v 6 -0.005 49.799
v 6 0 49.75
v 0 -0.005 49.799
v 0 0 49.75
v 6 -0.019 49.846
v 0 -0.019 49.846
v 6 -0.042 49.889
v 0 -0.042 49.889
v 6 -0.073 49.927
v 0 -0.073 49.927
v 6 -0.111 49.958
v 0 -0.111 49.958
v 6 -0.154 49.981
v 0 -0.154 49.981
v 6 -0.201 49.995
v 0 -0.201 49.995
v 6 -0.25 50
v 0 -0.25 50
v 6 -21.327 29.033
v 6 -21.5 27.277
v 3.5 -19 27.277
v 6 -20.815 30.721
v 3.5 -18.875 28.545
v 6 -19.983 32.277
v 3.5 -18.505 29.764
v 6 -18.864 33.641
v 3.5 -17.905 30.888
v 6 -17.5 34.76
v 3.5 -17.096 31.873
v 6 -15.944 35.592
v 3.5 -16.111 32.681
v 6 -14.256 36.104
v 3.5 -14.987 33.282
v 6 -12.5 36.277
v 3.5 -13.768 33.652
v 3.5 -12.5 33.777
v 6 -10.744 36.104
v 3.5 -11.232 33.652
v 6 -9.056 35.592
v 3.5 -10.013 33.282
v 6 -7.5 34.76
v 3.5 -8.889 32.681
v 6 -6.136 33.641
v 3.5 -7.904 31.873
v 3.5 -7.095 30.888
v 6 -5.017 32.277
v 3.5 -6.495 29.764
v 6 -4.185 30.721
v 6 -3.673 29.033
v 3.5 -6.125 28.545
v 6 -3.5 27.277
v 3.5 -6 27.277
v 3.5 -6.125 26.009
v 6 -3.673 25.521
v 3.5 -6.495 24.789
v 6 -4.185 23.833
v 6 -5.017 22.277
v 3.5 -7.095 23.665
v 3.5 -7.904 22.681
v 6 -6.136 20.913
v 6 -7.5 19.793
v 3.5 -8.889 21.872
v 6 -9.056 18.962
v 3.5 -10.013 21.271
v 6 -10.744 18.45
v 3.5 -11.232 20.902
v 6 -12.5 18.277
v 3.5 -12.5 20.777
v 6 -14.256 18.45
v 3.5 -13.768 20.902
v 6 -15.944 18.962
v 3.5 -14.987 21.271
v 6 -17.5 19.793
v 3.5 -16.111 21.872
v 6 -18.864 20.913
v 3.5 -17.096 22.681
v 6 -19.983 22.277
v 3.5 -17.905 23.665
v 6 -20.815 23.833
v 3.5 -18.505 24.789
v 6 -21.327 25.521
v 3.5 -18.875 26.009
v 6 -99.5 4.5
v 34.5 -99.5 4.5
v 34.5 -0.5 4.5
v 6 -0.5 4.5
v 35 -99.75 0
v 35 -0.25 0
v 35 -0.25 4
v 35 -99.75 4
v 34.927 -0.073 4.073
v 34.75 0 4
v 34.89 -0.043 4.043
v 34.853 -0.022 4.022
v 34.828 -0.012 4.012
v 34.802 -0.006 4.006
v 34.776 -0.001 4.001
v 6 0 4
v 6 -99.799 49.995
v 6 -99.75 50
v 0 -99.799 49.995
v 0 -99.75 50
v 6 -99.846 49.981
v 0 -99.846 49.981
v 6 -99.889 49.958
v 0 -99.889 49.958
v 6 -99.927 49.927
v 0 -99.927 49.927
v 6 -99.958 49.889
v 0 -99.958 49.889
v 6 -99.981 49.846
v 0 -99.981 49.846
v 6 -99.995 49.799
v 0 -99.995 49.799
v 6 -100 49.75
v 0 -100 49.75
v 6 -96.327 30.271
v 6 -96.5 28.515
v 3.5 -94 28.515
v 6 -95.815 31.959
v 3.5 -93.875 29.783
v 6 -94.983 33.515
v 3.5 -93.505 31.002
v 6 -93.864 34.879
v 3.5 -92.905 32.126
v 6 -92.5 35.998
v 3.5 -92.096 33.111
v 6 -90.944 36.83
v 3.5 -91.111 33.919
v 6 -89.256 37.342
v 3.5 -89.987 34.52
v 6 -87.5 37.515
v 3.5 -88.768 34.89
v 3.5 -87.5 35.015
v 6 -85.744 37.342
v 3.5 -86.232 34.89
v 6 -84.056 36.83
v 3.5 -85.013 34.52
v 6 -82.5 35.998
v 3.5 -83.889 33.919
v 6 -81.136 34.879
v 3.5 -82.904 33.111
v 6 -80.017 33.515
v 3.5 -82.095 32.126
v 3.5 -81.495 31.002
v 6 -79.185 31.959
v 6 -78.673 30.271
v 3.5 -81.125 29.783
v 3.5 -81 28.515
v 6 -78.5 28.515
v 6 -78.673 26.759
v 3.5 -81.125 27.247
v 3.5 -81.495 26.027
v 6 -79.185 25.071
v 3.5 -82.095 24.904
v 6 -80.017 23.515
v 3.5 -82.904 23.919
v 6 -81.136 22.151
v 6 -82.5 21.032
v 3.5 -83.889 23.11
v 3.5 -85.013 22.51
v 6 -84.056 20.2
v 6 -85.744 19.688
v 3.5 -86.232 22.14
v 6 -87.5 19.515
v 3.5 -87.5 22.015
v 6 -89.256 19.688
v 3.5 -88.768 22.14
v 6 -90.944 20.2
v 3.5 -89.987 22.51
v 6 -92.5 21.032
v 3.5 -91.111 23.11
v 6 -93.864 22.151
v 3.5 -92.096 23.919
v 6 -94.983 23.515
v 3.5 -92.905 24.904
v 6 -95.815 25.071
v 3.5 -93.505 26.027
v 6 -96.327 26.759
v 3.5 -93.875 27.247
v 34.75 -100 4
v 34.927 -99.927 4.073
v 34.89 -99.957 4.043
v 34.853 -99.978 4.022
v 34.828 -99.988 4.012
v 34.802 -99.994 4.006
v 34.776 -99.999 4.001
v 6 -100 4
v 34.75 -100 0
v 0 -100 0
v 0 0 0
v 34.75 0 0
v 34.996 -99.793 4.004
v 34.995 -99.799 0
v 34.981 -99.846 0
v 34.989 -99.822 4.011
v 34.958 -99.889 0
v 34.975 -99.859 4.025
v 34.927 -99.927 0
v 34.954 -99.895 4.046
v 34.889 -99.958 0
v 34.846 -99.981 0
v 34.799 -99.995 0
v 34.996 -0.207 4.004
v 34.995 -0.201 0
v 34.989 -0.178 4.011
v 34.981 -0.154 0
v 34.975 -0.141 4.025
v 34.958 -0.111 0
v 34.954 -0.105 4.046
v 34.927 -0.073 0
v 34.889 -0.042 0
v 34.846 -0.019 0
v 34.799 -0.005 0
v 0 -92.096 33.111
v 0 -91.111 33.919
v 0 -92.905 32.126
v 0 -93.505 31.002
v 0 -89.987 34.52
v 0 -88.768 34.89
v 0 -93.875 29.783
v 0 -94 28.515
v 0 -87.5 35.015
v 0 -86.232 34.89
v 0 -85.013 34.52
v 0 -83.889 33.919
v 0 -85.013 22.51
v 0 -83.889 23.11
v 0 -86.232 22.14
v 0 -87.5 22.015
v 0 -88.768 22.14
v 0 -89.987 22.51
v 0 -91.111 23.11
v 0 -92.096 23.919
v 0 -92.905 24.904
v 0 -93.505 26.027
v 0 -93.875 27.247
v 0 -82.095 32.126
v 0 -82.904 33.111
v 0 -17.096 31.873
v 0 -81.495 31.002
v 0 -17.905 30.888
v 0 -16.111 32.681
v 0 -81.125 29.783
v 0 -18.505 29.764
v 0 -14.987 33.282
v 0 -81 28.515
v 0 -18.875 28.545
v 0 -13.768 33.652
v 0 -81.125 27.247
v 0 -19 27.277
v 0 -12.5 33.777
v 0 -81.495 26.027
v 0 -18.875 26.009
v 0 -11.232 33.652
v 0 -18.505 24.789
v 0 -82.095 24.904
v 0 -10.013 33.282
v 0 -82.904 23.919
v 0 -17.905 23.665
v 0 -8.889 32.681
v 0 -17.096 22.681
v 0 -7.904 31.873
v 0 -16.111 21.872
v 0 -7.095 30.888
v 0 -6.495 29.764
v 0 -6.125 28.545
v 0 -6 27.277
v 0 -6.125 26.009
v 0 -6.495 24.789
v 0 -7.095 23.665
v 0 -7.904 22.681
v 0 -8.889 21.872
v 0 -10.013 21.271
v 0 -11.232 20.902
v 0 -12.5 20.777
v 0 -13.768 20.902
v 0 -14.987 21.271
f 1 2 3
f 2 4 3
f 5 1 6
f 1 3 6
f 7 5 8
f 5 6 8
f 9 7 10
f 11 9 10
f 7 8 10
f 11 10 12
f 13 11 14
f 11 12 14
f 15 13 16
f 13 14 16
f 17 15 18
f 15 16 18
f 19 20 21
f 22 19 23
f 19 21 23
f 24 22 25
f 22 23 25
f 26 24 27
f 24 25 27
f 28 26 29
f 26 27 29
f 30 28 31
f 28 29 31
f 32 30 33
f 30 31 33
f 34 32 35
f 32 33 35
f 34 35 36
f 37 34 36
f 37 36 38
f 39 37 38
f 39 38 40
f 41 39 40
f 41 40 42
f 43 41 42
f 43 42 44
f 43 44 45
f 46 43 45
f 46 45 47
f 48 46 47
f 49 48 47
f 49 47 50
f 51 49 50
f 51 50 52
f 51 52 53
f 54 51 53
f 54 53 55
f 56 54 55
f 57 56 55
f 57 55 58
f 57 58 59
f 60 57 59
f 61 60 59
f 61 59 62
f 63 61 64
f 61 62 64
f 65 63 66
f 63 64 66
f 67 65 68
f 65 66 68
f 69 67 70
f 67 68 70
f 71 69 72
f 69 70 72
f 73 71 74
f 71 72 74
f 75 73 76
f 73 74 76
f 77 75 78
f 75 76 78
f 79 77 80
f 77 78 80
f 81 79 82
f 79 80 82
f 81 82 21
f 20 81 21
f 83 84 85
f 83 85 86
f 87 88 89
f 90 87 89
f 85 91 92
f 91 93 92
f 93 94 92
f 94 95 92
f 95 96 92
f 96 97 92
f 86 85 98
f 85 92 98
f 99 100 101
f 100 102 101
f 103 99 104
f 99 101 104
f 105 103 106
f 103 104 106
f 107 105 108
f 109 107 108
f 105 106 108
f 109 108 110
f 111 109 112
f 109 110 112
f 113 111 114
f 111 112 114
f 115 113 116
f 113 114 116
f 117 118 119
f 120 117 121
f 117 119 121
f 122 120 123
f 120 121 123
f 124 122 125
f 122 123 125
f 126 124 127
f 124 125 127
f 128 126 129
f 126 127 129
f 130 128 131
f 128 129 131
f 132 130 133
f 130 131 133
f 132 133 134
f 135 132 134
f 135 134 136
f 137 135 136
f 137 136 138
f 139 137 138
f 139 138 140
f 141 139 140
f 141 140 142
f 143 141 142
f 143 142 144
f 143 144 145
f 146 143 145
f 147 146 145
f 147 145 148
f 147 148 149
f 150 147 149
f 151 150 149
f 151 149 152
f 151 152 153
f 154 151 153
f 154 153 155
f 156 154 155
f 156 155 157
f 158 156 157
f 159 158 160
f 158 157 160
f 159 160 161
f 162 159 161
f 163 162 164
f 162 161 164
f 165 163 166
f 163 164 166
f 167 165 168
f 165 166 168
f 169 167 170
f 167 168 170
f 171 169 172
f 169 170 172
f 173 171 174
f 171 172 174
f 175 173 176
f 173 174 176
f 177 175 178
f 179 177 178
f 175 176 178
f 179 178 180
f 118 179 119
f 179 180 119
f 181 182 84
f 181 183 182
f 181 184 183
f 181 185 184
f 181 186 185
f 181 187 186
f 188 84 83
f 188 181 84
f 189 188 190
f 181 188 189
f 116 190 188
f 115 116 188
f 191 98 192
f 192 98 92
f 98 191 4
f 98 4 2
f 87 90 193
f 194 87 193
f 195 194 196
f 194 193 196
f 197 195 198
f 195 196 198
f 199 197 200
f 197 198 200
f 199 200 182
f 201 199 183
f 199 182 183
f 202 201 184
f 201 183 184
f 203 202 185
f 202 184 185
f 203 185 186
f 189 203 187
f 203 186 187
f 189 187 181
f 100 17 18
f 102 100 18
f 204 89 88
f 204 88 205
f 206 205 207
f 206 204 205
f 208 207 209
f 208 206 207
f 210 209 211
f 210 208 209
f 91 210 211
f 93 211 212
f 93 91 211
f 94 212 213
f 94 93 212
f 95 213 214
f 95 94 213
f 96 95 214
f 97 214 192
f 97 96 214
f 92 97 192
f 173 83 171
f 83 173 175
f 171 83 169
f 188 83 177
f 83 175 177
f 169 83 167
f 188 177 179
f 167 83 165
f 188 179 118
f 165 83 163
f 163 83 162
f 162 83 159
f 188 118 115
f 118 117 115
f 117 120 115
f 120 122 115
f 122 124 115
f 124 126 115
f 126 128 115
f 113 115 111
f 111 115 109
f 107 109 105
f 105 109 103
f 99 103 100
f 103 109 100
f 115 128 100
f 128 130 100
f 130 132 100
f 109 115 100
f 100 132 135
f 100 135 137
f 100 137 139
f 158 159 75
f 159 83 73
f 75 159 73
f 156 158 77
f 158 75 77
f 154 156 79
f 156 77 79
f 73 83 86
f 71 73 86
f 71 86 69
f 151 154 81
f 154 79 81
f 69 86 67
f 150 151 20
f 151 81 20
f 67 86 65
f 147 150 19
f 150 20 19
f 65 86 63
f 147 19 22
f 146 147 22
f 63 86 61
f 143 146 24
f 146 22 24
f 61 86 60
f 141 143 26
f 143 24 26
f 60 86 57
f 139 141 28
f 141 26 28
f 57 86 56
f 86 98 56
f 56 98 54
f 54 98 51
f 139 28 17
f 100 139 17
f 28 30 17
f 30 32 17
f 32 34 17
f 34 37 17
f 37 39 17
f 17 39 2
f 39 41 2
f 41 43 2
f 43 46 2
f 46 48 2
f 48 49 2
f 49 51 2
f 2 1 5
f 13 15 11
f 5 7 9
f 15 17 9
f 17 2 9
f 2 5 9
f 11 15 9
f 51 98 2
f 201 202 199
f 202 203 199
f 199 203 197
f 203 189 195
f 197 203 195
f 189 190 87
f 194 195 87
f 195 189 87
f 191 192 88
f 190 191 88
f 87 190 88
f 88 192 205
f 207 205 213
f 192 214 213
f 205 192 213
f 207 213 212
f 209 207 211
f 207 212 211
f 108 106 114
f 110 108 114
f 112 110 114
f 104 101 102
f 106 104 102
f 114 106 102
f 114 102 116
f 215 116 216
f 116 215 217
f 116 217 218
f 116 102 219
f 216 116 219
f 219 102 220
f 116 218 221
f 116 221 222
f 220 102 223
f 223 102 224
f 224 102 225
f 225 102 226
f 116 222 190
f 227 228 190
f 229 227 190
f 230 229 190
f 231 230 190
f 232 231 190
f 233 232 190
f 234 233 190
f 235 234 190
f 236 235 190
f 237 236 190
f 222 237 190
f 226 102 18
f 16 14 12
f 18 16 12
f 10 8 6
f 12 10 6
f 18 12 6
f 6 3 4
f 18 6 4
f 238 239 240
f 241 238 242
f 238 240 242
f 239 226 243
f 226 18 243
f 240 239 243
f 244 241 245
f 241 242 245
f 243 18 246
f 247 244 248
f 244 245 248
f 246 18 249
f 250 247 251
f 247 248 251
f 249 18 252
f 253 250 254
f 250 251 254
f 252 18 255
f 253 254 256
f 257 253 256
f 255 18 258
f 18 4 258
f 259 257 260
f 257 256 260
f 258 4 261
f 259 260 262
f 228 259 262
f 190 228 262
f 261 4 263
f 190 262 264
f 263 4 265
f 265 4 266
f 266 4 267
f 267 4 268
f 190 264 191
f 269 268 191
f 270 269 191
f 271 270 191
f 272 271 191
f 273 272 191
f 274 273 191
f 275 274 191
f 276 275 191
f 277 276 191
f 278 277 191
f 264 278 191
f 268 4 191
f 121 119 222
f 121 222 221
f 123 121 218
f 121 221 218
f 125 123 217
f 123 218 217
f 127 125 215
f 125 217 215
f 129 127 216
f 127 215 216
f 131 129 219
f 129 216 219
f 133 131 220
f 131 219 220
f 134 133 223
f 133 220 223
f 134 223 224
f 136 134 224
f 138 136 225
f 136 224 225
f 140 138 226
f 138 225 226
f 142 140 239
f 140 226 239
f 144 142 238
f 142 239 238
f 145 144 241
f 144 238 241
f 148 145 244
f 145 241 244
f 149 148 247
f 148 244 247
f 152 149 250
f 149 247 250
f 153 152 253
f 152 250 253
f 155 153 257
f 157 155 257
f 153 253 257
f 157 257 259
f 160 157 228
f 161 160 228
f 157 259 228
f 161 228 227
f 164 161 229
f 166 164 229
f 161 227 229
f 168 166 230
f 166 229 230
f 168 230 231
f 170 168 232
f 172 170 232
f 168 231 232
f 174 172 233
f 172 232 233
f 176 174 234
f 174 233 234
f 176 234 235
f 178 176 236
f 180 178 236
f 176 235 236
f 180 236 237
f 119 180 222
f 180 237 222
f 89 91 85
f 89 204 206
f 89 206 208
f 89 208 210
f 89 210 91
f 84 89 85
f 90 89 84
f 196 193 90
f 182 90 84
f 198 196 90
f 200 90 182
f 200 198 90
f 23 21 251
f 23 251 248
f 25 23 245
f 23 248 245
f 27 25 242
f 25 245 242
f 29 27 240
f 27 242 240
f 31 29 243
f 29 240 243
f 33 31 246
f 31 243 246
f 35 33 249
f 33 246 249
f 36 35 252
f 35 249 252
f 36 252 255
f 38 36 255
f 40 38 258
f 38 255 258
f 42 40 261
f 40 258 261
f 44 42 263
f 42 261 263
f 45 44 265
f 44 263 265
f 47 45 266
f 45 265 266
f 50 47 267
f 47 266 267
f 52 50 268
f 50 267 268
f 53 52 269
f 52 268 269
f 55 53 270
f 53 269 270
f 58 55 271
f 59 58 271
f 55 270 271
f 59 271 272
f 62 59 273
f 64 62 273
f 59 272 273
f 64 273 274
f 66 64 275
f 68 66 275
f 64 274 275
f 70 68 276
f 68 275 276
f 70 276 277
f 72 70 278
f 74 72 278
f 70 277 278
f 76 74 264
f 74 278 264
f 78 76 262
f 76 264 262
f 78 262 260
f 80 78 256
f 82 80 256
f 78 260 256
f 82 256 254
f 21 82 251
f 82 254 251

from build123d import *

# Parameters (mm, degrees)
F1_DEPTH       = 100
F3_D           = 13
F3_DEPTH       = 10
F3_CSINK_D     = 18
F3_CSINK_ANGLE = 90
F4_SIZE        = 0.5
F5_R           = 0.25


with BuildPart() as f1:
    # F0 (on Front) → F1 (new body)
    with BuildSketch(Plane.XZ):
        Polygon((0, 50), (0, 0), (35, 0), (35, 4.5), (6, 4.5), (6, 50), align=None)
    extrude(amount=F1_DEPTH)

    # F3
    with Locations(Plane.YZ.offset(6)):
        with Locations((-87.5, 28.514809), (-12.5, 27.276697)):
            CounterSinkHole(F3_D / 2, F3_CSINK_D / 2, depth=F3_DEPTH, counter_sink_angle=F3_CSINK_ANGLE)

    # F4
    f4_edges = [f1.edges().sort_by_distance(p)[0] for p in [
        (20.5, -100, 4.5),
        (35, -50, 4.5),
        (20.5, 0, 4.5),
    ]]
    chamfer(f4_edges, length=F4_SIZE)

    # F5
    f5_edges = [f1.edges().sort_by_distance(p)[0] for p in [
        (3, -100, 50),
        (3, 0, 50),
        (35, -100, 2),
        (35, 0, 2),
    ]]
    fillet(f5_edges, radius=F5_R)


solid = f1.part
